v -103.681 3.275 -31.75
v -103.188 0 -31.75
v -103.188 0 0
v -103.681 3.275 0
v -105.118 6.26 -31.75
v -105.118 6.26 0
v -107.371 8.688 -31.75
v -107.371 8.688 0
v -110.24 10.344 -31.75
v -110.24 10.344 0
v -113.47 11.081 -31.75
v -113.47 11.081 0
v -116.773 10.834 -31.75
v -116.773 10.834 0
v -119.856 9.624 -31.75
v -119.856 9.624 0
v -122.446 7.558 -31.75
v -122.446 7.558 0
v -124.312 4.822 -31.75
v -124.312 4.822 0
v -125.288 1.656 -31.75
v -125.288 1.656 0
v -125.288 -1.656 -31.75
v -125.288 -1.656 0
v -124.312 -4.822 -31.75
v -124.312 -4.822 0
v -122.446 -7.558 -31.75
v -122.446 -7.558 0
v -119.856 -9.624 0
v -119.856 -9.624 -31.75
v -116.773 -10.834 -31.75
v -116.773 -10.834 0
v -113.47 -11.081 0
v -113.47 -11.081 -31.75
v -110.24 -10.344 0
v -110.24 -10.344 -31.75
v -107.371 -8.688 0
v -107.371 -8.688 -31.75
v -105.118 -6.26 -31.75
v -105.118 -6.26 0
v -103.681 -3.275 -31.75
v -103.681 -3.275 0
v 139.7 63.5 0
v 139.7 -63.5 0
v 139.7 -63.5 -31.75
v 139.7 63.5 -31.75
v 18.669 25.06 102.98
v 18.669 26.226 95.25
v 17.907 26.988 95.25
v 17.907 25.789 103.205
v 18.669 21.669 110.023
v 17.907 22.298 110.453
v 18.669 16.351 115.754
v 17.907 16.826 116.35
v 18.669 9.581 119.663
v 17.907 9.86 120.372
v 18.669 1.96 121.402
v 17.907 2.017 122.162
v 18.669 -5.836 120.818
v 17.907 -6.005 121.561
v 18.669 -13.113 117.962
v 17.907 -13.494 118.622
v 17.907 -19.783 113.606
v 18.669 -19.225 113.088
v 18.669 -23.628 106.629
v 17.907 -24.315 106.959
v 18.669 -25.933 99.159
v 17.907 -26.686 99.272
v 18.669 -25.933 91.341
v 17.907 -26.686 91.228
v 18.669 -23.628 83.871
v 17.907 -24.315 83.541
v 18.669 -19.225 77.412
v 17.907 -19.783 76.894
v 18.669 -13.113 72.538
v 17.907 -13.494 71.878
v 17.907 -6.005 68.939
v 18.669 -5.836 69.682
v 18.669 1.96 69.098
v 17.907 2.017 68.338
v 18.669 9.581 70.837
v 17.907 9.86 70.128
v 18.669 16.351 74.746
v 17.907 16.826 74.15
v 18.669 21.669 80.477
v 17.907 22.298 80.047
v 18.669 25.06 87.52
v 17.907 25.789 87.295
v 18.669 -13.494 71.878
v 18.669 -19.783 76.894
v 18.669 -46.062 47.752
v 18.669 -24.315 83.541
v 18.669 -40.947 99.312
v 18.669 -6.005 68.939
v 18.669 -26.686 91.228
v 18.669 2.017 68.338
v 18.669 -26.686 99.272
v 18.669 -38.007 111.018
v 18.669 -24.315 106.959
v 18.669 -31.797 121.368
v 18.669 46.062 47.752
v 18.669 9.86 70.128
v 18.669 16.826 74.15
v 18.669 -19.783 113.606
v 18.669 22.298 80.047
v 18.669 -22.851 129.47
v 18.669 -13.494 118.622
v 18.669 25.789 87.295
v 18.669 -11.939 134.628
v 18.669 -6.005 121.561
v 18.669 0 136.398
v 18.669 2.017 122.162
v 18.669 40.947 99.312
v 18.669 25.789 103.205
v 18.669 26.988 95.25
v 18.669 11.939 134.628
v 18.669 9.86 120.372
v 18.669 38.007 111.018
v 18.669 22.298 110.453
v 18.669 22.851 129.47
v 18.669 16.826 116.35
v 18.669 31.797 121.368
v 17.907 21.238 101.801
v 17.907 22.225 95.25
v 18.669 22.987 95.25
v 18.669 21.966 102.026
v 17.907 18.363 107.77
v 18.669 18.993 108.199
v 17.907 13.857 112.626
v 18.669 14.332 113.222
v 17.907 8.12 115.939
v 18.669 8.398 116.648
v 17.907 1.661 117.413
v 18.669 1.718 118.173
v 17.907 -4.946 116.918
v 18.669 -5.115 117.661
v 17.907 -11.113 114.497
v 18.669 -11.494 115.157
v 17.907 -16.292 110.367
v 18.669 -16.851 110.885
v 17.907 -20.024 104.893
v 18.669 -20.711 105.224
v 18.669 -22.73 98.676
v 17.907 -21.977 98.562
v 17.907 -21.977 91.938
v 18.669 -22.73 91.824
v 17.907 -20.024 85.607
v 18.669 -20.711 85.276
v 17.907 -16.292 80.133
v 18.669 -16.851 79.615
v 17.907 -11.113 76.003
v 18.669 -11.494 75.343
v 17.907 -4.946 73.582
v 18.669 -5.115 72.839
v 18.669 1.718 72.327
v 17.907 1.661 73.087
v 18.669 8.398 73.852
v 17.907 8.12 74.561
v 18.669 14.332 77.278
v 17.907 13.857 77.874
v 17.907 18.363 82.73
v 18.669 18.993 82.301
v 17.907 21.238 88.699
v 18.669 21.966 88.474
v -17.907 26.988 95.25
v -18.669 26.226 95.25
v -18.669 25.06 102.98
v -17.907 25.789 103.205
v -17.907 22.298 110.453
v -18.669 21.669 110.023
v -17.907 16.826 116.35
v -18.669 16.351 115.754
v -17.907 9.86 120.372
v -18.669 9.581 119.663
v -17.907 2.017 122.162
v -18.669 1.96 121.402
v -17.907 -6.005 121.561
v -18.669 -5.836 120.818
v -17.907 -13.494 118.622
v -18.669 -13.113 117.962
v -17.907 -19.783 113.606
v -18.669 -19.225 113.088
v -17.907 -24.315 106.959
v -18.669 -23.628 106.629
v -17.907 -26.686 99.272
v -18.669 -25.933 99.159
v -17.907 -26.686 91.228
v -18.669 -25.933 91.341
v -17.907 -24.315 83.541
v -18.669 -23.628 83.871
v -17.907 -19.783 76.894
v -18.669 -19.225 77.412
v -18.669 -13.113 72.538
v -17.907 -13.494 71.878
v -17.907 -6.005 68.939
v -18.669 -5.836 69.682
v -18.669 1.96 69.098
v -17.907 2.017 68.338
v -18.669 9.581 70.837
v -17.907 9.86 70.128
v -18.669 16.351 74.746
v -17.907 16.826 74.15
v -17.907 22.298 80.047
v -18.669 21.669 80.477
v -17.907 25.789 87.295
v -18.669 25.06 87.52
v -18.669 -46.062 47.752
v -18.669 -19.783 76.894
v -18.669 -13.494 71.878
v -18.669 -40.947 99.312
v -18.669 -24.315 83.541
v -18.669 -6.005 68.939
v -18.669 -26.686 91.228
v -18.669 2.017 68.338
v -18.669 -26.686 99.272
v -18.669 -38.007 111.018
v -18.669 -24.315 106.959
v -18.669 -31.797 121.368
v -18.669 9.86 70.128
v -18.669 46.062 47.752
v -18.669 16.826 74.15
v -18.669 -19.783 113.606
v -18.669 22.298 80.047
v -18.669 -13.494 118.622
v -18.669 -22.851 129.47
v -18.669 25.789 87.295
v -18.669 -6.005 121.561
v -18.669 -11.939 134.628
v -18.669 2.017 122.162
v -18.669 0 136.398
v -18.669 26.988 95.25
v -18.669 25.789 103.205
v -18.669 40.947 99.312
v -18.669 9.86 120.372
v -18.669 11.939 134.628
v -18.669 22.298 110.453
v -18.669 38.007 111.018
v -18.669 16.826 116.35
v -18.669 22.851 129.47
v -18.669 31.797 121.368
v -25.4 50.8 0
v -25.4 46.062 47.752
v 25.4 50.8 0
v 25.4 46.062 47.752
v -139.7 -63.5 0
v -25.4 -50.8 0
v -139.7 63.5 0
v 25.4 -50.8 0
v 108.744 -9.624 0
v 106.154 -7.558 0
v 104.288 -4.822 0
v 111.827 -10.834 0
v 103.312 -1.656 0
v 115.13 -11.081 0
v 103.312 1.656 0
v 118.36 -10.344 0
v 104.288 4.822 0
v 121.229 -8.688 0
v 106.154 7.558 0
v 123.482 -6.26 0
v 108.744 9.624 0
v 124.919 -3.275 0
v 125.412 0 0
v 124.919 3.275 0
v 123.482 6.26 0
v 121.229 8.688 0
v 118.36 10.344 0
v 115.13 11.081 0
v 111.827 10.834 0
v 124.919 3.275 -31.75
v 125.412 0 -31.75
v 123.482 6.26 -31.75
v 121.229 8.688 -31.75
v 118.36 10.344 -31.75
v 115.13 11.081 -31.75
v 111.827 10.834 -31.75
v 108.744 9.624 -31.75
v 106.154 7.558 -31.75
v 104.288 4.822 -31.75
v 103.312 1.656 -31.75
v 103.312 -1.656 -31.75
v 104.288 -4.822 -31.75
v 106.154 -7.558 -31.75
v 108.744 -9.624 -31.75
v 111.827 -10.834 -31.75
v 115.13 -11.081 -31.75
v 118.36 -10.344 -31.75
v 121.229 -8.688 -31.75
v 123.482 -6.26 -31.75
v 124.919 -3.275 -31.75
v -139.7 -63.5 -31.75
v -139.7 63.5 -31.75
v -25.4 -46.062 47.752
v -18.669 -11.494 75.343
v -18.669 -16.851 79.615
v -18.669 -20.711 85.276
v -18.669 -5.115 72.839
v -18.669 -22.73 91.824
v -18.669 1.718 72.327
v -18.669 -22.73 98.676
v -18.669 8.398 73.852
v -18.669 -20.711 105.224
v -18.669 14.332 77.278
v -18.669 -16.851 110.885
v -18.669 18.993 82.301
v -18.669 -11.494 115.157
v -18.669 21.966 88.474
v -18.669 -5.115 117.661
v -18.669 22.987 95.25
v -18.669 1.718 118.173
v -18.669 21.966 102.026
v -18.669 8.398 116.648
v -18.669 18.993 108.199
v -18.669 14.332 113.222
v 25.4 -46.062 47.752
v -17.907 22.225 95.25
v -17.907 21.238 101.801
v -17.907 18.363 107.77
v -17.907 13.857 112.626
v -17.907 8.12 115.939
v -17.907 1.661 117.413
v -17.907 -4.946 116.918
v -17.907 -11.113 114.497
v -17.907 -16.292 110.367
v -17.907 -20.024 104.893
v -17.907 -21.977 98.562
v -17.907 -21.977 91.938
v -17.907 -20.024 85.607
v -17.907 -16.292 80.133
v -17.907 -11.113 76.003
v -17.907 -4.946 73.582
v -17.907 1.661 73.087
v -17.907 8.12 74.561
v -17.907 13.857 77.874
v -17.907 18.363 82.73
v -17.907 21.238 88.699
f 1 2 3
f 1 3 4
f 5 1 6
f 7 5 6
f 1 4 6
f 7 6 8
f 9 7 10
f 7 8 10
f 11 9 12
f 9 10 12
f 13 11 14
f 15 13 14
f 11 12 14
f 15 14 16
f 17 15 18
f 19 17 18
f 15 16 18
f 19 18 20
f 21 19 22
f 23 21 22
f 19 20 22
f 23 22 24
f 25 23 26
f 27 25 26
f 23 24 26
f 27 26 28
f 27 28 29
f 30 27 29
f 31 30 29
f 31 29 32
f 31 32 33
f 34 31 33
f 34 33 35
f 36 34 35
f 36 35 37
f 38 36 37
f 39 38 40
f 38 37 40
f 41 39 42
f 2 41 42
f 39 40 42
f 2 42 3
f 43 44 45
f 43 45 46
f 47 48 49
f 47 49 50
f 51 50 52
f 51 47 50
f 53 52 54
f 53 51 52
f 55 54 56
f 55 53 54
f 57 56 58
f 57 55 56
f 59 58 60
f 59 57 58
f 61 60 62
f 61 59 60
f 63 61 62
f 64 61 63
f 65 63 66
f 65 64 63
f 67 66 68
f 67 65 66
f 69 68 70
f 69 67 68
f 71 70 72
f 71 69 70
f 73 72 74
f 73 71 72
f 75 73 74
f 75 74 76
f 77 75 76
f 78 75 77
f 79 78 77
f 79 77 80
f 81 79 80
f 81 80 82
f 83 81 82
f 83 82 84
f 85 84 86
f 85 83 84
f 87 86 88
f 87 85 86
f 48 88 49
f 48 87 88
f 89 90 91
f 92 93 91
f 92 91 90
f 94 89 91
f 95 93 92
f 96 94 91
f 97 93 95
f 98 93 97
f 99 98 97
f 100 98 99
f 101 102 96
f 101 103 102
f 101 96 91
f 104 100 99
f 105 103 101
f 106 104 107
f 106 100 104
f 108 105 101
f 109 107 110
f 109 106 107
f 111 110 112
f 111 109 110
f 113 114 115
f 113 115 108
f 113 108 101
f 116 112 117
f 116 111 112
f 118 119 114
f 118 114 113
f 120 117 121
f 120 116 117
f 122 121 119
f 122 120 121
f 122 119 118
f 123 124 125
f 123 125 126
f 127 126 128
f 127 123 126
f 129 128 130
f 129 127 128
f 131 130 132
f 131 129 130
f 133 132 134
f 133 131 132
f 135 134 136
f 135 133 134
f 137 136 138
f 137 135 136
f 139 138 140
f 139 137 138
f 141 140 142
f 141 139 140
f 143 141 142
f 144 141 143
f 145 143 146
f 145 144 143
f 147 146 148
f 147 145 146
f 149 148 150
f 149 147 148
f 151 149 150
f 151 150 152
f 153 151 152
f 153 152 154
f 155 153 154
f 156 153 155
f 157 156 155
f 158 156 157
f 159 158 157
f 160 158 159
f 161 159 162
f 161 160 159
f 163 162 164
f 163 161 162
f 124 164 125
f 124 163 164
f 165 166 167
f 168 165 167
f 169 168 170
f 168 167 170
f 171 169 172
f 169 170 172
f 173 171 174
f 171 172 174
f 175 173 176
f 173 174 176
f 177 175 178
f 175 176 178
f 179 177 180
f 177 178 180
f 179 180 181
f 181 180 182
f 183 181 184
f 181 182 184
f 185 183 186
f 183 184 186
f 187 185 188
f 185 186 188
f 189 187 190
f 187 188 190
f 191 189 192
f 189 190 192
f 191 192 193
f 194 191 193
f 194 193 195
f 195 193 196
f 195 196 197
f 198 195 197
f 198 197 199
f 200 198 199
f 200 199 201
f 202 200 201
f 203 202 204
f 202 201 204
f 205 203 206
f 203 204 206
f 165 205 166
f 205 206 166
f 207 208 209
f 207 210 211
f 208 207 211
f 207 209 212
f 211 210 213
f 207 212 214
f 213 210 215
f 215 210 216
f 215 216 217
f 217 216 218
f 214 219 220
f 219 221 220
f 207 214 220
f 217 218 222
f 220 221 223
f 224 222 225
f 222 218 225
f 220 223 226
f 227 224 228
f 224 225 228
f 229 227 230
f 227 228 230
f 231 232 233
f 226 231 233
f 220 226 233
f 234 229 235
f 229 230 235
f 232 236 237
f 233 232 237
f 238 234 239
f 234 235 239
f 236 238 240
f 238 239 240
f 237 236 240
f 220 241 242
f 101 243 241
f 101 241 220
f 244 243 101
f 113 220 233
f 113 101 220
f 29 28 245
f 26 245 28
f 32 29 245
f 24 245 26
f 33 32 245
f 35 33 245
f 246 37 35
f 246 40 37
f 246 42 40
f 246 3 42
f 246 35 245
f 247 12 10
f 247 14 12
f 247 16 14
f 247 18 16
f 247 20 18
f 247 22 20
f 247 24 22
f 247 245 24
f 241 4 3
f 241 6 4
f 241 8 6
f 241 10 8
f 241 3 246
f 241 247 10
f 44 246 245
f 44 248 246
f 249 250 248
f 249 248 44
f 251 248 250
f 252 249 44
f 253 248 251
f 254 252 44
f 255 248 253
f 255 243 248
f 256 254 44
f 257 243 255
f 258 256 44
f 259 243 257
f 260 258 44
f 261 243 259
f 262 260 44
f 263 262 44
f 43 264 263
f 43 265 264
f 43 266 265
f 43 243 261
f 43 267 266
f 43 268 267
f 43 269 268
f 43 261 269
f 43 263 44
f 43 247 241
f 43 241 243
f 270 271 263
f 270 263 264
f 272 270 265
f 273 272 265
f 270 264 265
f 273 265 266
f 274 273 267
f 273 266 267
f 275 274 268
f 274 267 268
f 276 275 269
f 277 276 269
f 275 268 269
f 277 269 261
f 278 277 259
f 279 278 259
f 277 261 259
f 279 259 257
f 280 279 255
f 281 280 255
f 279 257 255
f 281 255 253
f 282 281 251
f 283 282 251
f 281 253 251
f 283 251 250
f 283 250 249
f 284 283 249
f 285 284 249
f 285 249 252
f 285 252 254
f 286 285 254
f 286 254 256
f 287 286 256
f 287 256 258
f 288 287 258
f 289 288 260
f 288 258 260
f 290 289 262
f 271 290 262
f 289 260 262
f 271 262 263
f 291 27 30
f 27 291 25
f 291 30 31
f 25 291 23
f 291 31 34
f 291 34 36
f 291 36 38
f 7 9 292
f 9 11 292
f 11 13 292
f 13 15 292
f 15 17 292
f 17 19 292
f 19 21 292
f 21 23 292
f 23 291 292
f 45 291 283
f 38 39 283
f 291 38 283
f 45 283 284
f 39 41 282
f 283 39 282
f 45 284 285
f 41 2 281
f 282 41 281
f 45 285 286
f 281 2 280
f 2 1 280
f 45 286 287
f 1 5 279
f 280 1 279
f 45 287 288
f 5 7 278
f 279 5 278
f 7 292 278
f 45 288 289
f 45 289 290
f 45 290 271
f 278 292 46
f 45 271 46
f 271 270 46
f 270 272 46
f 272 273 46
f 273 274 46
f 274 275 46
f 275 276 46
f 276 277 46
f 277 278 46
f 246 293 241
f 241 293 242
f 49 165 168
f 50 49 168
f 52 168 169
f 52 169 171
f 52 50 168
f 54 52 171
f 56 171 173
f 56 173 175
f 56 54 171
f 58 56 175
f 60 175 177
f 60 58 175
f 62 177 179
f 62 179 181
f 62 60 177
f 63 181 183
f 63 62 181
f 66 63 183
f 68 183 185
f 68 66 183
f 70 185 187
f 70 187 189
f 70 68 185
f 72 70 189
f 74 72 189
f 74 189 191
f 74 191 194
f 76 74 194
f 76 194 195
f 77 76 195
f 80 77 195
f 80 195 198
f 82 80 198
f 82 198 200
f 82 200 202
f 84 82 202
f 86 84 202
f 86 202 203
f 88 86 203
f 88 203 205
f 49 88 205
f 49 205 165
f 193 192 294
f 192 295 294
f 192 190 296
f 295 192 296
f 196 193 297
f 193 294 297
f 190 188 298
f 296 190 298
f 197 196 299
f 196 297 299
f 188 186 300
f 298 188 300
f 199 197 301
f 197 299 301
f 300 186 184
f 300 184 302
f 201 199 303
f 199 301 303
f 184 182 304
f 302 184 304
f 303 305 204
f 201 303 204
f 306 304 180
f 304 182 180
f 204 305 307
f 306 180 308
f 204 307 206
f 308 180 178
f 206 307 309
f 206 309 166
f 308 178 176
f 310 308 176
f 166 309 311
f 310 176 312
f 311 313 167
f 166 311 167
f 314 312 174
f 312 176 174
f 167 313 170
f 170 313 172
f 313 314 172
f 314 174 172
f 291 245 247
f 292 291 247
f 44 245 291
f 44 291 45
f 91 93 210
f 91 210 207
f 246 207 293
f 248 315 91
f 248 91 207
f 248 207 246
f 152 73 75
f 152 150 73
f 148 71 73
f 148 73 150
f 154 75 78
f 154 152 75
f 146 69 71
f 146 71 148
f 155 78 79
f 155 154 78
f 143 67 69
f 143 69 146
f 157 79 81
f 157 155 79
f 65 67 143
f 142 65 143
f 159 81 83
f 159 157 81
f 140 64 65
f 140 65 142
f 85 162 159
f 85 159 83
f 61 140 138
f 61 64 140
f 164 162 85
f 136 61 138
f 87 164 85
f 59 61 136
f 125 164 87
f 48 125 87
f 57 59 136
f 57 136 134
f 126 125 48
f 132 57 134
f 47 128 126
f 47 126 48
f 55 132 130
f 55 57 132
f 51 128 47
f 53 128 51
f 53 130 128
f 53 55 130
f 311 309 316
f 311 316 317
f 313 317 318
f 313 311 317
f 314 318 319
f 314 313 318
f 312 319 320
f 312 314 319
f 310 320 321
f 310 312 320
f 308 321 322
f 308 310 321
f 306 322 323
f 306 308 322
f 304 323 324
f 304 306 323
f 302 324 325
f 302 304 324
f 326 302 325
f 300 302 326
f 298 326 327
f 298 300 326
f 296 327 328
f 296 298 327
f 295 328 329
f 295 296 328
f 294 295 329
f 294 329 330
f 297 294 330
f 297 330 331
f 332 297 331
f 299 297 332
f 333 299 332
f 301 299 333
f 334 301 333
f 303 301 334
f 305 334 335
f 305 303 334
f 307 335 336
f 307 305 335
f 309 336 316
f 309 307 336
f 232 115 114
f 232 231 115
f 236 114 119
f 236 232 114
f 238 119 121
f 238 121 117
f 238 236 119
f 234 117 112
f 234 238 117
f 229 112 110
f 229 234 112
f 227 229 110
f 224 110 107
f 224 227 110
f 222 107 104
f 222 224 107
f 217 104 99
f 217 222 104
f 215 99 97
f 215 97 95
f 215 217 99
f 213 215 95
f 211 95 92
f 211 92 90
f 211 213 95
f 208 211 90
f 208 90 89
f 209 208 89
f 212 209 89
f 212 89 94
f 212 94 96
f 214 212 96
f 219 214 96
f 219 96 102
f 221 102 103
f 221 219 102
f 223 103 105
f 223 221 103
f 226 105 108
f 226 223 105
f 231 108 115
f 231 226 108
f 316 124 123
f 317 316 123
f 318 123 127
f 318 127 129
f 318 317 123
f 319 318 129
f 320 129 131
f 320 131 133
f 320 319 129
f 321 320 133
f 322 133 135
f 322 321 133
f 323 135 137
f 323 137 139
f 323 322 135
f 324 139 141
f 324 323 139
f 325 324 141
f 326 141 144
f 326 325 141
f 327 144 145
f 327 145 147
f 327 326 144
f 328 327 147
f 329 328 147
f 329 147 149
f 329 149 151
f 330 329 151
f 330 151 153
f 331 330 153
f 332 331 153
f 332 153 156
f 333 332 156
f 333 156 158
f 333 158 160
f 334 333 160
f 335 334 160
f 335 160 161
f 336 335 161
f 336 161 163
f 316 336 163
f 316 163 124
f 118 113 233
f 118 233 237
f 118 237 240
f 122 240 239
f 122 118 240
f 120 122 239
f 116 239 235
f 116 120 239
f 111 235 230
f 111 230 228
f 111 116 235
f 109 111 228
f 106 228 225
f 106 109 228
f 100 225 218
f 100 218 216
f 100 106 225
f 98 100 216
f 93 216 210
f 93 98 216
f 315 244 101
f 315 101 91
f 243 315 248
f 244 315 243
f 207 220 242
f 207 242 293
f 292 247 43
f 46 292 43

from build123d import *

# Parameters (mm, degrees)
F0_W     = 279.4
F0_H     = 127
F0_R     = 11.1125
F1_DEPTH = 31.75
F2_R     = 26.9875
F3_DEPTH = 18.669
F5_DEPTH = 25.4
F6_R     = 26.9875
F6_R_2   = 22.225
F7_DEPTH = 18.669
F8_SIZE  = 0.762


with BuildPart() as f1:
    # F0 (on Top) → F1 (new body)
    with BuildSketch(Plane.XY):
        Rectangle(F0_W, F0_H)
        with Locations((-114.3, 0)):
            Circle(F0_R, mode=Mode.SUBTRACT)
        with Locations((114.3, 0)):
            Circle(F0_R, mode=Mode.SUBTRACT)
    extrude(amount=-F1_DEPTH)

    # F2 (on Right) → F3 (join, symmetric)
    with BuildSketch(Plane.YZ):
        with BuildLine():
            Line((50.8, 0), (40.9469707894, 99.312448421))
            ThreePointArc((40.9469707894, 99.312448421), (0, 136.398), (-40.9469707894, 99.312448421))
            Line((-40.9469707894, 99.312448421), (-50.8, 0))
            Line((-50.8, 0), (50.8, 0))
        make_face()
        with Locations((0, 95.25)):
            Circle(F2_R, mode=Mode.SUBTRACT)
    extrude(amount=F3_DEPTH, both=True)

    # F4 (on Right) → F5 (join, symmetric)
    with BuildSketch(Plane.YZ):
        Polygon((-50.8, 0), (50.8, 0), (46.0624081035, 47.752), (-46.0624081035, 47.752), align=None)
    extrude(amount=F5_DEPTH, both=True)


with BuildPart() as f7:
    # F6 (on Right) → F7 (new body, symmetric)
    with BuildSketch(Plane.YZ):
        with Locations((0, 95.25)):
            Circle(F6_R)
        with Locations((0, 95.25)):
            Circle(F6_R_2, mode=Mode.SUBTRACT)
    extrude(amount=F7_DEPTH, both=True)

    # F8
    f8_edges = [f7.edges().sort_by_distance(p)[0] for p in [
        (-18.669, -26.9875, 95.25),
        (-18.669, -22.225, 95.25),
        (18.669, -26.9875, 95.25),
        (18.669, -22.225, 95.25),
    ]]
    chamfer(f8_edges, length=F8_SIZE)


solid = Compound([f1.part, f7.part])
